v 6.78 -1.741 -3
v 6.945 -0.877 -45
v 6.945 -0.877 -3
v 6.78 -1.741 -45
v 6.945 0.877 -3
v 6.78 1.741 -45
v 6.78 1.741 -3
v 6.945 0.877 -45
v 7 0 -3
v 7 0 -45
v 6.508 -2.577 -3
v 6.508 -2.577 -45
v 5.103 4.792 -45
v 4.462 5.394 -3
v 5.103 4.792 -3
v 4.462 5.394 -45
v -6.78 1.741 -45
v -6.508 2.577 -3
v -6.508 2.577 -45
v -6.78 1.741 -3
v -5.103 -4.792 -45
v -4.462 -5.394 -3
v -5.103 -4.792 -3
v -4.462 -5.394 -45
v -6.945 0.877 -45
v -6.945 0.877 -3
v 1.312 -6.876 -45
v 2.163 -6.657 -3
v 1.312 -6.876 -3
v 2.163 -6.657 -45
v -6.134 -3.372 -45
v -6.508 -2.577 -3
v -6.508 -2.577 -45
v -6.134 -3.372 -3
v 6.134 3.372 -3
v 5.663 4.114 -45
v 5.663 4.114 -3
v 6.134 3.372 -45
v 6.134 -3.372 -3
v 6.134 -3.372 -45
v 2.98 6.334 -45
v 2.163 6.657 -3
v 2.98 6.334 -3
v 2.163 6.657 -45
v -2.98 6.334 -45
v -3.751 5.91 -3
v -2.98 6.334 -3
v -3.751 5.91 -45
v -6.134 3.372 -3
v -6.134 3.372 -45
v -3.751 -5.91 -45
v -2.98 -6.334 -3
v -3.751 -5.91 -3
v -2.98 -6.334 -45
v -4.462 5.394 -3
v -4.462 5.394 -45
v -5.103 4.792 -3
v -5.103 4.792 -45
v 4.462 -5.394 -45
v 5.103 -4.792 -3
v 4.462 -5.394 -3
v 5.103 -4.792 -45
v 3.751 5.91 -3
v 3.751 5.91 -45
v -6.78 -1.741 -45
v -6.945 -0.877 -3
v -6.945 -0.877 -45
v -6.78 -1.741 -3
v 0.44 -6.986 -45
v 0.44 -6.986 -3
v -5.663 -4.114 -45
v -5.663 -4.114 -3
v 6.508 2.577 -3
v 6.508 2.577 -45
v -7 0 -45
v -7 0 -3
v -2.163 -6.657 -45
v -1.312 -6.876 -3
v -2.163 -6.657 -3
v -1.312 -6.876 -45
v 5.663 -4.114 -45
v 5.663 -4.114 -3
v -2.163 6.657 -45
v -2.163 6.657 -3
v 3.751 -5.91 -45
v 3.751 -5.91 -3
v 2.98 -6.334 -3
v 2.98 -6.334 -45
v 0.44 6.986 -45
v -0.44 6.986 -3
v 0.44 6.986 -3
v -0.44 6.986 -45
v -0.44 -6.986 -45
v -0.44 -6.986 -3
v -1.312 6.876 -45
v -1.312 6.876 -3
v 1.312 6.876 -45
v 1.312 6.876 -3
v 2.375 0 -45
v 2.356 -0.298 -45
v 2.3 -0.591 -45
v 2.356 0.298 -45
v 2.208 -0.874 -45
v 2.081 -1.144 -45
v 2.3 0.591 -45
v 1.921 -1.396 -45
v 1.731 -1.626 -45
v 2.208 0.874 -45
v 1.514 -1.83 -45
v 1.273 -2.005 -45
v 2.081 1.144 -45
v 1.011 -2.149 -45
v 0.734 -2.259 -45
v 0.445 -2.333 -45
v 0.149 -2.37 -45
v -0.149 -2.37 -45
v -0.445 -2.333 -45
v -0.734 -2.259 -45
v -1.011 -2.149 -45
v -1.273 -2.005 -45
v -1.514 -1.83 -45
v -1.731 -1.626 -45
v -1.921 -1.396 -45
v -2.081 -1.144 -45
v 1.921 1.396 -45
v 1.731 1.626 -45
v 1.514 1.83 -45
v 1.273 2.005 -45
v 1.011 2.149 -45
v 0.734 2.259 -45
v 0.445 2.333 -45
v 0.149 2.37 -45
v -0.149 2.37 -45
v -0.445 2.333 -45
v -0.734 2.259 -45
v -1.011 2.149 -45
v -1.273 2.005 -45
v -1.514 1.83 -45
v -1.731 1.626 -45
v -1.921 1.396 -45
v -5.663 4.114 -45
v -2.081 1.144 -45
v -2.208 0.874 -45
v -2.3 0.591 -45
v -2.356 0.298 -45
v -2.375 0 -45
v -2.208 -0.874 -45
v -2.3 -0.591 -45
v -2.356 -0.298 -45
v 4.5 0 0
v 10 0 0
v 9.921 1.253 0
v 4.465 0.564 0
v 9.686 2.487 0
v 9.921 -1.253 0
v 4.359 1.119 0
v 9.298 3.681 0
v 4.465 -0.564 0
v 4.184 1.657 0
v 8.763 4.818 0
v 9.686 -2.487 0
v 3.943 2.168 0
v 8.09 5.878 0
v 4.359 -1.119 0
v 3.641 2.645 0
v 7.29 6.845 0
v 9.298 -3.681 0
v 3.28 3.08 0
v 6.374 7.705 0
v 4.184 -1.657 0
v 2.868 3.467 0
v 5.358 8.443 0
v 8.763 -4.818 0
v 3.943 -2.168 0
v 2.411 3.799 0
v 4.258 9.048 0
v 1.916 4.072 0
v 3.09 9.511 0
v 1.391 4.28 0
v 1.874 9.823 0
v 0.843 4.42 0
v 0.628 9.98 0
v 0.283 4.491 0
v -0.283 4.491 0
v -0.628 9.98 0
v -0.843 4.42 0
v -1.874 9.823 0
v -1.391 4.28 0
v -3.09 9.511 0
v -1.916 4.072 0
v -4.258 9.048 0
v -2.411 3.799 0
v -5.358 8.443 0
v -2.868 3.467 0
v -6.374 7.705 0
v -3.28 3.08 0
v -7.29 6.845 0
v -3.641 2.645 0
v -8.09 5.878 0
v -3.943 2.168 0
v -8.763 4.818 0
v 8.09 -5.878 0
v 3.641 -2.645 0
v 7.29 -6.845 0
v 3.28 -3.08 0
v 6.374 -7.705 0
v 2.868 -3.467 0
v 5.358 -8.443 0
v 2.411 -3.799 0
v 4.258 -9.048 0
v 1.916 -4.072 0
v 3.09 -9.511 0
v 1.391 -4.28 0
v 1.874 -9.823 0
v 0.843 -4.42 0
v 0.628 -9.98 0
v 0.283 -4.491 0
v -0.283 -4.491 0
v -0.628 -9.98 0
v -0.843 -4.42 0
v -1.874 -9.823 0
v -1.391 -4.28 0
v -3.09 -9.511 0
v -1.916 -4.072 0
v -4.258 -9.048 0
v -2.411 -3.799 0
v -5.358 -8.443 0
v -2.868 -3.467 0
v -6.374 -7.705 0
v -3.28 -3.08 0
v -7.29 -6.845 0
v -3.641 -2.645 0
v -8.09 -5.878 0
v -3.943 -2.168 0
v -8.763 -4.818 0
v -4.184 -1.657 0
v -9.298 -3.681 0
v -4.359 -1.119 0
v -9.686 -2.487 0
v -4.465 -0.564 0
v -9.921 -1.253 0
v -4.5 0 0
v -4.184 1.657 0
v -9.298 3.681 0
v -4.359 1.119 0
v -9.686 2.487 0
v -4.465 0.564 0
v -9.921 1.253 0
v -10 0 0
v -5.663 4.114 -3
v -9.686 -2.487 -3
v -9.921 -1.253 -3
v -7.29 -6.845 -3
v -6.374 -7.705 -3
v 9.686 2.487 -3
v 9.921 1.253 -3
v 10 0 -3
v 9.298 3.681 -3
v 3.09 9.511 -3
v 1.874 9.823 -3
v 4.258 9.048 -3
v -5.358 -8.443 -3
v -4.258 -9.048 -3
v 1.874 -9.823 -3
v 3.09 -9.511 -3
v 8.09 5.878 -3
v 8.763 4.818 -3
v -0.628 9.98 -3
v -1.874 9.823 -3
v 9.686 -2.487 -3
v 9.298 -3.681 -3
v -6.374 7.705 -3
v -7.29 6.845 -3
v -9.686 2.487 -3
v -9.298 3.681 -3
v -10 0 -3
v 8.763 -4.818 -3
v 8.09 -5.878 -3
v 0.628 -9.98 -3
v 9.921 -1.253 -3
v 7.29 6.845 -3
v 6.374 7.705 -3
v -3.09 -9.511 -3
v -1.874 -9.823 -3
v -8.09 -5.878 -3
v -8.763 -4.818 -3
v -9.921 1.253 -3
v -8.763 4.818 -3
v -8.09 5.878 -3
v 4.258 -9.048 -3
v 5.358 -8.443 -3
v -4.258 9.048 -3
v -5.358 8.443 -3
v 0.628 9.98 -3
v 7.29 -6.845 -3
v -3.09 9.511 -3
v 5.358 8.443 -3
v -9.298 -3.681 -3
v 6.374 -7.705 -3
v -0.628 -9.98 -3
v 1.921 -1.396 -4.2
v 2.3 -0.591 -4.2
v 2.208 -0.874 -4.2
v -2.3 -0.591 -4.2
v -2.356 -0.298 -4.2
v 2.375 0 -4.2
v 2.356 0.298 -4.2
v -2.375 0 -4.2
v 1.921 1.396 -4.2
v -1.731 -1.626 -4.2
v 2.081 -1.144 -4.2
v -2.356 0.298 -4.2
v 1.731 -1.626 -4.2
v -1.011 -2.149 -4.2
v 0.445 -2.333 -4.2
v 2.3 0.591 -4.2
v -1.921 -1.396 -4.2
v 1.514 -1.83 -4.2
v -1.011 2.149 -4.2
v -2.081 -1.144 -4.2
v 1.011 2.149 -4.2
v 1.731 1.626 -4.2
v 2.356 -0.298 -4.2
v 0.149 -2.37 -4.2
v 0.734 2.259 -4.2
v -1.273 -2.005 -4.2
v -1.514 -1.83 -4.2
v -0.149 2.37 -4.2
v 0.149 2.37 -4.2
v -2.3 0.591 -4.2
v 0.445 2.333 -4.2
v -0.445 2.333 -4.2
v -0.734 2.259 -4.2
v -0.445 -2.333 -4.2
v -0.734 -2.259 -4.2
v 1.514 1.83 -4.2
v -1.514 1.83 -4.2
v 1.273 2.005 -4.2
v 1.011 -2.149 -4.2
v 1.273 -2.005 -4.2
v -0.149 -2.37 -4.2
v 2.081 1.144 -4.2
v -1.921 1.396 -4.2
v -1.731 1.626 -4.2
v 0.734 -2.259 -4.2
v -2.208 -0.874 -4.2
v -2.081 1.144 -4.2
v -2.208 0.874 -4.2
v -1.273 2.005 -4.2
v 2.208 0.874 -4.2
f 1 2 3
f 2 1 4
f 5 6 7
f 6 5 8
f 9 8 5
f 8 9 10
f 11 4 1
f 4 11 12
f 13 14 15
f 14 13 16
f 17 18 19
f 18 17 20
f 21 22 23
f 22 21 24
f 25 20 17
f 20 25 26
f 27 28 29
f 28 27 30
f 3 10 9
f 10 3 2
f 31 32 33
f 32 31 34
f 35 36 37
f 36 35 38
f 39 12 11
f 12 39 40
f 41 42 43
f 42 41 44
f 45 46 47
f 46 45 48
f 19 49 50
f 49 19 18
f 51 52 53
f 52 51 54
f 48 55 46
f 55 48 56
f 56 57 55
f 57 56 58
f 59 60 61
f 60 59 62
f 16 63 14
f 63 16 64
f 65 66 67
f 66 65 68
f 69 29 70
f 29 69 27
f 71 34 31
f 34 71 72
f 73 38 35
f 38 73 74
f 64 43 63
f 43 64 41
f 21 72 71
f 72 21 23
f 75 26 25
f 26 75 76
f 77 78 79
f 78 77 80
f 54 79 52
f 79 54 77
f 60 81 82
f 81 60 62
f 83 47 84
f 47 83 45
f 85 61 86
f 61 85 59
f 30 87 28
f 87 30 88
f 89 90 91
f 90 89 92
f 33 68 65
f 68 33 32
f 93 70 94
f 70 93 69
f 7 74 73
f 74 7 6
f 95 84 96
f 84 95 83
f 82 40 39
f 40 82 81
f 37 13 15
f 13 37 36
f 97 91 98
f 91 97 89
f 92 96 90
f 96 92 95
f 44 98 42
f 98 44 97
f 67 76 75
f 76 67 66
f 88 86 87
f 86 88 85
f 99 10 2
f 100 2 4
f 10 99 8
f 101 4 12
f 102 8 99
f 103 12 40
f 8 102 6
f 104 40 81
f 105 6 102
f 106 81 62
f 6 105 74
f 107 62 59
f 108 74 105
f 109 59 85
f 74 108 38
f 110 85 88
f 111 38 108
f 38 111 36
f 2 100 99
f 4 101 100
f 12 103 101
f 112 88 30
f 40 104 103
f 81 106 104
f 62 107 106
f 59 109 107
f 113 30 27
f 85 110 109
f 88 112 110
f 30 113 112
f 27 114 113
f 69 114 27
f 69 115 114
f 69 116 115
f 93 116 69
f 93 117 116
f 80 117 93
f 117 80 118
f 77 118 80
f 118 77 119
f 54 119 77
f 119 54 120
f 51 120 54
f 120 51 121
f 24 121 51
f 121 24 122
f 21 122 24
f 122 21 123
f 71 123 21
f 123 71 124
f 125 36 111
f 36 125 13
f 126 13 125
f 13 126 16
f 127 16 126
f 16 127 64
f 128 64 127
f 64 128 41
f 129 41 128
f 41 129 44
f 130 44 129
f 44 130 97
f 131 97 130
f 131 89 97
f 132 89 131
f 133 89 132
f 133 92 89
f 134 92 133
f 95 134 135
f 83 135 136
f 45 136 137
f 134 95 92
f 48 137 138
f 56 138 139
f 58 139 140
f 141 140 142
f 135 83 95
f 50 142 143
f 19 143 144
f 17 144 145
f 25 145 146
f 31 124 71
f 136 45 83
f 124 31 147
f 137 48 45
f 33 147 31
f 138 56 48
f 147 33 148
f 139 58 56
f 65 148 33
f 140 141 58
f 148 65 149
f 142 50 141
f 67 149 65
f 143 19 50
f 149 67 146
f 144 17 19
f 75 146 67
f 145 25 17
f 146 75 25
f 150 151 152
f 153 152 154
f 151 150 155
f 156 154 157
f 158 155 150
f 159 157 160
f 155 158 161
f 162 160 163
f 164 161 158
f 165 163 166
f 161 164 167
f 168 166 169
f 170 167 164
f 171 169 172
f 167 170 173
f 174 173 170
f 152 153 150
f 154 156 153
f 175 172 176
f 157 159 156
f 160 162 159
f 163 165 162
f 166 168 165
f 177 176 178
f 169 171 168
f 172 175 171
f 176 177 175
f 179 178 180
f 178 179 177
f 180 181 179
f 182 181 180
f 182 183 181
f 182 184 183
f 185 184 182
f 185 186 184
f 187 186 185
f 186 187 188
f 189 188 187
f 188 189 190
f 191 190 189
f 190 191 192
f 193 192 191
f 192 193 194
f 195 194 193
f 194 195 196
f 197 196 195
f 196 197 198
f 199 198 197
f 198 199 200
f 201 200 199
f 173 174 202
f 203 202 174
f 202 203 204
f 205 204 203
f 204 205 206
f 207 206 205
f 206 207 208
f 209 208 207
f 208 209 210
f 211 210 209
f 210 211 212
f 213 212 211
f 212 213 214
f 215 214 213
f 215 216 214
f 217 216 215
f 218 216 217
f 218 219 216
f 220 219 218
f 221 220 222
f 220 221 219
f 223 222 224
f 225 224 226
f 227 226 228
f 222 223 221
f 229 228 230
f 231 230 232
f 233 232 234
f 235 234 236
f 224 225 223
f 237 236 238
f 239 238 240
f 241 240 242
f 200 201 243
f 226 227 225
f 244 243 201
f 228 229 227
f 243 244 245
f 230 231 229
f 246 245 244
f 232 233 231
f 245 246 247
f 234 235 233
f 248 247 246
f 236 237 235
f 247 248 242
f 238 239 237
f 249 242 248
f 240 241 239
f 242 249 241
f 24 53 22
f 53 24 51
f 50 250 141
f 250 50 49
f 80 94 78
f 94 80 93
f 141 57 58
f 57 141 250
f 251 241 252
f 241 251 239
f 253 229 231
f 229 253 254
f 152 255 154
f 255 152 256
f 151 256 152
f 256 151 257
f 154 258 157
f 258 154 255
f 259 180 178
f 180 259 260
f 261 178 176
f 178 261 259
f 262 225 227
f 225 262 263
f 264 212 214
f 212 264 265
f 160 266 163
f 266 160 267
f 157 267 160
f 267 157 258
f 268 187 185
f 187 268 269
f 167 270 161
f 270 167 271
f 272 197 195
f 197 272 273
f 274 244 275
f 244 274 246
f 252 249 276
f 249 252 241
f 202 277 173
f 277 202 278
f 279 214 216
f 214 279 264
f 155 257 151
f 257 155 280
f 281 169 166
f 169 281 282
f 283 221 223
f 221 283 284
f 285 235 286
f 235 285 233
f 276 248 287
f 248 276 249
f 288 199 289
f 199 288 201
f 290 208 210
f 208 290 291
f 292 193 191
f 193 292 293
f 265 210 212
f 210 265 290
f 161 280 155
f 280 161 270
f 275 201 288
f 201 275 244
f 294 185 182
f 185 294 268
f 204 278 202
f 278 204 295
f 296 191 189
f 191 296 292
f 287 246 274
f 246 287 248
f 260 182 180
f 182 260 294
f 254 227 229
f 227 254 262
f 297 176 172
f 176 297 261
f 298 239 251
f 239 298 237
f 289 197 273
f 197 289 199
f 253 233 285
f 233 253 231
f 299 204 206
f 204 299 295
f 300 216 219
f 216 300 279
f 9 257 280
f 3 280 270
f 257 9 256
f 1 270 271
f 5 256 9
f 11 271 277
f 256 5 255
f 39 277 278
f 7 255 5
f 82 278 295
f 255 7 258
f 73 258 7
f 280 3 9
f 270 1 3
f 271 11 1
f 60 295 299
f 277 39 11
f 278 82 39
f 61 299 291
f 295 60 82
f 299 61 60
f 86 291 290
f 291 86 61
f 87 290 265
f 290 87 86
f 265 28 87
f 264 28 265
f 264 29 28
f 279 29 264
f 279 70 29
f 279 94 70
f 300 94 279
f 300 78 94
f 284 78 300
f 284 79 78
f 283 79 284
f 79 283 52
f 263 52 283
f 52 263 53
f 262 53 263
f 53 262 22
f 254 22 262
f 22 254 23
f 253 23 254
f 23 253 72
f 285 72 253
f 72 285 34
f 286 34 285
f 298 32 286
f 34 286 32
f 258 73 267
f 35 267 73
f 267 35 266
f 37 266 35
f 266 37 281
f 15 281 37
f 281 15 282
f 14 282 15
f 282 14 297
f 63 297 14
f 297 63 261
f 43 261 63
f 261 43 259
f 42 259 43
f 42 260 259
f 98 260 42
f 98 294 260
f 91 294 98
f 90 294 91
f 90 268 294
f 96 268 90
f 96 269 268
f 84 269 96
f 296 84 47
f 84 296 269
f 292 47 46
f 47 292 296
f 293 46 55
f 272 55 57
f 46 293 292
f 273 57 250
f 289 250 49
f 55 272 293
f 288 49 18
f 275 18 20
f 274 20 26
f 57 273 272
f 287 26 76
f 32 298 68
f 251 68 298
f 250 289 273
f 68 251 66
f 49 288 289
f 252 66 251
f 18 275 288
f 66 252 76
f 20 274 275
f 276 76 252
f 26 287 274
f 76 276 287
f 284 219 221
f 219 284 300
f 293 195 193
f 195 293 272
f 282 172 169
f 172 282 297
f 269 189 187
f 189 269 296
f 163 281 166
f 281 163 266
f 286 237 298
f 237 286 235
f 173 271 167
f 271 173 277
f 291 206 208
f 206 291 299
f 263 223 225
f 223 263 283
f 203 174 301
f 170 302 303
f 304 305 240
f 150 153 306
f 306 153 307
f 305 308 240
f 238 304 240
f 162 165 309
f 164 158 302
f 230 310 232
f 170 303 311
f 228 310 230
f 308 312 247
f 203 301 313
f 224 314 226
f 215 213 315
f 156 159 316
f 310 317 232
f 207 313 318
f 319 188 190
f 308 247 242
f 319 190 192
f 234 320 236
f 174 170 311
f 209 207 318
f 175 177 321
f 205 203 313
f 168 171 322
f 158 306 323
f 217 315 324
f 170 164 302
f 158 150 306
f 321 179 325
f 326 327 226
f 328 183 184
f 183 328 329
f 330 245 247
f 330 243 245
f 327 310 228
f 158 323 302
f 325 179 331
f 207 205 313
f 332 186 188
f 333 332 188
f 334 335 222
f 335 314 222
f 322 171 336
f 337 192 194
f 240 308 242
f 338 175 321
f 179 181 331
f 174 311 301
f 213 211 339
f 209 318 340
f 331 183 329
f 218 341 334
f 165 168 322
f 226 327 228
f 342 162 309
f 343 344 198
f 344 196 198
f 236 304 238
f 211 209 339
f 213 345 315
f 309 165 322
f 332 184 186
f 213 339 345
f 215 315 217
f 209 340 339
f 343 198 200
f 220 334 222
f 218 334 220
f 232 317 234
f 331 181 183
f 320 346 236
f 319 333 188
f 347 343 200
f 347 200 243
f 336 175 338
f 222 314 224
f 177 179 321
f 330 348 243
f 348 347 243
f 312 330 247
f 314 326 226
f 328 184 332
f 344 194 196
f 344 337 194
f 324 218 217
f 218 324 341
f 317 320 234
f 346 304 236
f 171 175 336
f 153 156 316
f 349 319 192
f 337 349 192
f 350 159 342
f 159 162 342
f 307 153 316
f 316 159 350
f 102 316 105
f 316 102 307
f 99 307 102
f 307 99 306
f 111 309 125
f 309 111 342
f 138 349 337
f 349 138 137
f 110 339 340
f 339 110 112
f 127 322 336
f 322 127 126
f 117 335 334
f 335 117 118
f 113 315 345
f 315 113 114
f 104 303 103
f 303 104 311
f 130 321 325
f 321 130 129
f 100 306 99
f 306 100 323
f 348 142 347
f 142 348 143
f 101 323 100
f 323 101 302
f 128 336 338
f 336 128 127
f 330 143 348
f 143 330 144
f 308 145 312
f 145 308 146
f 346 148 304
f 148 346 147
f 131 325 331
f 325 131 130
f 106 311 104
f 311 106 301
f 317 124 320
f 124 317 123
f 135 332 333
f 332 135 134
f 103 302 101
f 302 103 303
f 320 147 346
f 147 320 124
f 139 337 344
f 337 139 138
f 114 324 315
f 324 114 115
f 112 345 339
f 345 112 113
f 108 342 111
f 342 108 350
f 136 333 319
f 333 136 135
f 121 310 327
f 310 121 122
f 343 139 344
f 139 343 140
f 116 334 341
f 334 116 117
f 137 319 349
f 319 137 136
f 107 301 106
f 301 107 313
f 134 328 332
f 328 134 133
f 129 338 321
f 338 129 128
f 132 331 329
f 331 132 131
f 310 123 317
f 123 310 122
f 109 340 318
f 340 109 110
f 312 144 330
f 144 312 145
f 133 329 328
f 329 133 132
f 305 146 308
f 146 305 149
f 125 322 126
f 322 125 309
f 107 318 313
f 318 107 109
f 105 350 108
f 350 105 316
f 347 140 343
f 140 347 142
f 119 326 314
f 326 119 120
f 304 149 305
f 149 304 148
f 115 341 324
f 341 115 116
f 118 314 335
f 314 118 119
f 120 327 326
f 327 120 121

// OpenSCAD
$fn = 50;


difference() {
	union() {
		translate(v = [0, 0, -45.0000000000]) {
			cylinder(h = 45, r = 7.0000000000);
		}
		translate(v = [0, 0, -3.0000000000]) {
			cylinder(h = 3, r = 10.0000000000);
		}
	}
	union() {
		translate(v = [0, 0, 0]) {
			rotate(a = [0, 0, 0]) {
				difference() {
					union() {
						#translate(v = [0, 0, -45.0000000000]) {
							cylinder(h = 45, r = 2.2500000000);
						}
						#translate(v = [0, 0, -4.2000000000]) {
							cylinder(h = 4.2000000000, r = 7.0000000000, r1 = 2.3750000000, r2 = 4.5000000000);
						}
						#translate(v = [0, 0, -45.0000000000]) {
							cylinder(h = 45, r = 2.3750000000);
						}
						#translate(v = [0, 0, -45.0000000000]) {
							cylinder(h = 45, r = 2.2500000000);
						}
					}
					union();
				}
			}
		}
	}
}
